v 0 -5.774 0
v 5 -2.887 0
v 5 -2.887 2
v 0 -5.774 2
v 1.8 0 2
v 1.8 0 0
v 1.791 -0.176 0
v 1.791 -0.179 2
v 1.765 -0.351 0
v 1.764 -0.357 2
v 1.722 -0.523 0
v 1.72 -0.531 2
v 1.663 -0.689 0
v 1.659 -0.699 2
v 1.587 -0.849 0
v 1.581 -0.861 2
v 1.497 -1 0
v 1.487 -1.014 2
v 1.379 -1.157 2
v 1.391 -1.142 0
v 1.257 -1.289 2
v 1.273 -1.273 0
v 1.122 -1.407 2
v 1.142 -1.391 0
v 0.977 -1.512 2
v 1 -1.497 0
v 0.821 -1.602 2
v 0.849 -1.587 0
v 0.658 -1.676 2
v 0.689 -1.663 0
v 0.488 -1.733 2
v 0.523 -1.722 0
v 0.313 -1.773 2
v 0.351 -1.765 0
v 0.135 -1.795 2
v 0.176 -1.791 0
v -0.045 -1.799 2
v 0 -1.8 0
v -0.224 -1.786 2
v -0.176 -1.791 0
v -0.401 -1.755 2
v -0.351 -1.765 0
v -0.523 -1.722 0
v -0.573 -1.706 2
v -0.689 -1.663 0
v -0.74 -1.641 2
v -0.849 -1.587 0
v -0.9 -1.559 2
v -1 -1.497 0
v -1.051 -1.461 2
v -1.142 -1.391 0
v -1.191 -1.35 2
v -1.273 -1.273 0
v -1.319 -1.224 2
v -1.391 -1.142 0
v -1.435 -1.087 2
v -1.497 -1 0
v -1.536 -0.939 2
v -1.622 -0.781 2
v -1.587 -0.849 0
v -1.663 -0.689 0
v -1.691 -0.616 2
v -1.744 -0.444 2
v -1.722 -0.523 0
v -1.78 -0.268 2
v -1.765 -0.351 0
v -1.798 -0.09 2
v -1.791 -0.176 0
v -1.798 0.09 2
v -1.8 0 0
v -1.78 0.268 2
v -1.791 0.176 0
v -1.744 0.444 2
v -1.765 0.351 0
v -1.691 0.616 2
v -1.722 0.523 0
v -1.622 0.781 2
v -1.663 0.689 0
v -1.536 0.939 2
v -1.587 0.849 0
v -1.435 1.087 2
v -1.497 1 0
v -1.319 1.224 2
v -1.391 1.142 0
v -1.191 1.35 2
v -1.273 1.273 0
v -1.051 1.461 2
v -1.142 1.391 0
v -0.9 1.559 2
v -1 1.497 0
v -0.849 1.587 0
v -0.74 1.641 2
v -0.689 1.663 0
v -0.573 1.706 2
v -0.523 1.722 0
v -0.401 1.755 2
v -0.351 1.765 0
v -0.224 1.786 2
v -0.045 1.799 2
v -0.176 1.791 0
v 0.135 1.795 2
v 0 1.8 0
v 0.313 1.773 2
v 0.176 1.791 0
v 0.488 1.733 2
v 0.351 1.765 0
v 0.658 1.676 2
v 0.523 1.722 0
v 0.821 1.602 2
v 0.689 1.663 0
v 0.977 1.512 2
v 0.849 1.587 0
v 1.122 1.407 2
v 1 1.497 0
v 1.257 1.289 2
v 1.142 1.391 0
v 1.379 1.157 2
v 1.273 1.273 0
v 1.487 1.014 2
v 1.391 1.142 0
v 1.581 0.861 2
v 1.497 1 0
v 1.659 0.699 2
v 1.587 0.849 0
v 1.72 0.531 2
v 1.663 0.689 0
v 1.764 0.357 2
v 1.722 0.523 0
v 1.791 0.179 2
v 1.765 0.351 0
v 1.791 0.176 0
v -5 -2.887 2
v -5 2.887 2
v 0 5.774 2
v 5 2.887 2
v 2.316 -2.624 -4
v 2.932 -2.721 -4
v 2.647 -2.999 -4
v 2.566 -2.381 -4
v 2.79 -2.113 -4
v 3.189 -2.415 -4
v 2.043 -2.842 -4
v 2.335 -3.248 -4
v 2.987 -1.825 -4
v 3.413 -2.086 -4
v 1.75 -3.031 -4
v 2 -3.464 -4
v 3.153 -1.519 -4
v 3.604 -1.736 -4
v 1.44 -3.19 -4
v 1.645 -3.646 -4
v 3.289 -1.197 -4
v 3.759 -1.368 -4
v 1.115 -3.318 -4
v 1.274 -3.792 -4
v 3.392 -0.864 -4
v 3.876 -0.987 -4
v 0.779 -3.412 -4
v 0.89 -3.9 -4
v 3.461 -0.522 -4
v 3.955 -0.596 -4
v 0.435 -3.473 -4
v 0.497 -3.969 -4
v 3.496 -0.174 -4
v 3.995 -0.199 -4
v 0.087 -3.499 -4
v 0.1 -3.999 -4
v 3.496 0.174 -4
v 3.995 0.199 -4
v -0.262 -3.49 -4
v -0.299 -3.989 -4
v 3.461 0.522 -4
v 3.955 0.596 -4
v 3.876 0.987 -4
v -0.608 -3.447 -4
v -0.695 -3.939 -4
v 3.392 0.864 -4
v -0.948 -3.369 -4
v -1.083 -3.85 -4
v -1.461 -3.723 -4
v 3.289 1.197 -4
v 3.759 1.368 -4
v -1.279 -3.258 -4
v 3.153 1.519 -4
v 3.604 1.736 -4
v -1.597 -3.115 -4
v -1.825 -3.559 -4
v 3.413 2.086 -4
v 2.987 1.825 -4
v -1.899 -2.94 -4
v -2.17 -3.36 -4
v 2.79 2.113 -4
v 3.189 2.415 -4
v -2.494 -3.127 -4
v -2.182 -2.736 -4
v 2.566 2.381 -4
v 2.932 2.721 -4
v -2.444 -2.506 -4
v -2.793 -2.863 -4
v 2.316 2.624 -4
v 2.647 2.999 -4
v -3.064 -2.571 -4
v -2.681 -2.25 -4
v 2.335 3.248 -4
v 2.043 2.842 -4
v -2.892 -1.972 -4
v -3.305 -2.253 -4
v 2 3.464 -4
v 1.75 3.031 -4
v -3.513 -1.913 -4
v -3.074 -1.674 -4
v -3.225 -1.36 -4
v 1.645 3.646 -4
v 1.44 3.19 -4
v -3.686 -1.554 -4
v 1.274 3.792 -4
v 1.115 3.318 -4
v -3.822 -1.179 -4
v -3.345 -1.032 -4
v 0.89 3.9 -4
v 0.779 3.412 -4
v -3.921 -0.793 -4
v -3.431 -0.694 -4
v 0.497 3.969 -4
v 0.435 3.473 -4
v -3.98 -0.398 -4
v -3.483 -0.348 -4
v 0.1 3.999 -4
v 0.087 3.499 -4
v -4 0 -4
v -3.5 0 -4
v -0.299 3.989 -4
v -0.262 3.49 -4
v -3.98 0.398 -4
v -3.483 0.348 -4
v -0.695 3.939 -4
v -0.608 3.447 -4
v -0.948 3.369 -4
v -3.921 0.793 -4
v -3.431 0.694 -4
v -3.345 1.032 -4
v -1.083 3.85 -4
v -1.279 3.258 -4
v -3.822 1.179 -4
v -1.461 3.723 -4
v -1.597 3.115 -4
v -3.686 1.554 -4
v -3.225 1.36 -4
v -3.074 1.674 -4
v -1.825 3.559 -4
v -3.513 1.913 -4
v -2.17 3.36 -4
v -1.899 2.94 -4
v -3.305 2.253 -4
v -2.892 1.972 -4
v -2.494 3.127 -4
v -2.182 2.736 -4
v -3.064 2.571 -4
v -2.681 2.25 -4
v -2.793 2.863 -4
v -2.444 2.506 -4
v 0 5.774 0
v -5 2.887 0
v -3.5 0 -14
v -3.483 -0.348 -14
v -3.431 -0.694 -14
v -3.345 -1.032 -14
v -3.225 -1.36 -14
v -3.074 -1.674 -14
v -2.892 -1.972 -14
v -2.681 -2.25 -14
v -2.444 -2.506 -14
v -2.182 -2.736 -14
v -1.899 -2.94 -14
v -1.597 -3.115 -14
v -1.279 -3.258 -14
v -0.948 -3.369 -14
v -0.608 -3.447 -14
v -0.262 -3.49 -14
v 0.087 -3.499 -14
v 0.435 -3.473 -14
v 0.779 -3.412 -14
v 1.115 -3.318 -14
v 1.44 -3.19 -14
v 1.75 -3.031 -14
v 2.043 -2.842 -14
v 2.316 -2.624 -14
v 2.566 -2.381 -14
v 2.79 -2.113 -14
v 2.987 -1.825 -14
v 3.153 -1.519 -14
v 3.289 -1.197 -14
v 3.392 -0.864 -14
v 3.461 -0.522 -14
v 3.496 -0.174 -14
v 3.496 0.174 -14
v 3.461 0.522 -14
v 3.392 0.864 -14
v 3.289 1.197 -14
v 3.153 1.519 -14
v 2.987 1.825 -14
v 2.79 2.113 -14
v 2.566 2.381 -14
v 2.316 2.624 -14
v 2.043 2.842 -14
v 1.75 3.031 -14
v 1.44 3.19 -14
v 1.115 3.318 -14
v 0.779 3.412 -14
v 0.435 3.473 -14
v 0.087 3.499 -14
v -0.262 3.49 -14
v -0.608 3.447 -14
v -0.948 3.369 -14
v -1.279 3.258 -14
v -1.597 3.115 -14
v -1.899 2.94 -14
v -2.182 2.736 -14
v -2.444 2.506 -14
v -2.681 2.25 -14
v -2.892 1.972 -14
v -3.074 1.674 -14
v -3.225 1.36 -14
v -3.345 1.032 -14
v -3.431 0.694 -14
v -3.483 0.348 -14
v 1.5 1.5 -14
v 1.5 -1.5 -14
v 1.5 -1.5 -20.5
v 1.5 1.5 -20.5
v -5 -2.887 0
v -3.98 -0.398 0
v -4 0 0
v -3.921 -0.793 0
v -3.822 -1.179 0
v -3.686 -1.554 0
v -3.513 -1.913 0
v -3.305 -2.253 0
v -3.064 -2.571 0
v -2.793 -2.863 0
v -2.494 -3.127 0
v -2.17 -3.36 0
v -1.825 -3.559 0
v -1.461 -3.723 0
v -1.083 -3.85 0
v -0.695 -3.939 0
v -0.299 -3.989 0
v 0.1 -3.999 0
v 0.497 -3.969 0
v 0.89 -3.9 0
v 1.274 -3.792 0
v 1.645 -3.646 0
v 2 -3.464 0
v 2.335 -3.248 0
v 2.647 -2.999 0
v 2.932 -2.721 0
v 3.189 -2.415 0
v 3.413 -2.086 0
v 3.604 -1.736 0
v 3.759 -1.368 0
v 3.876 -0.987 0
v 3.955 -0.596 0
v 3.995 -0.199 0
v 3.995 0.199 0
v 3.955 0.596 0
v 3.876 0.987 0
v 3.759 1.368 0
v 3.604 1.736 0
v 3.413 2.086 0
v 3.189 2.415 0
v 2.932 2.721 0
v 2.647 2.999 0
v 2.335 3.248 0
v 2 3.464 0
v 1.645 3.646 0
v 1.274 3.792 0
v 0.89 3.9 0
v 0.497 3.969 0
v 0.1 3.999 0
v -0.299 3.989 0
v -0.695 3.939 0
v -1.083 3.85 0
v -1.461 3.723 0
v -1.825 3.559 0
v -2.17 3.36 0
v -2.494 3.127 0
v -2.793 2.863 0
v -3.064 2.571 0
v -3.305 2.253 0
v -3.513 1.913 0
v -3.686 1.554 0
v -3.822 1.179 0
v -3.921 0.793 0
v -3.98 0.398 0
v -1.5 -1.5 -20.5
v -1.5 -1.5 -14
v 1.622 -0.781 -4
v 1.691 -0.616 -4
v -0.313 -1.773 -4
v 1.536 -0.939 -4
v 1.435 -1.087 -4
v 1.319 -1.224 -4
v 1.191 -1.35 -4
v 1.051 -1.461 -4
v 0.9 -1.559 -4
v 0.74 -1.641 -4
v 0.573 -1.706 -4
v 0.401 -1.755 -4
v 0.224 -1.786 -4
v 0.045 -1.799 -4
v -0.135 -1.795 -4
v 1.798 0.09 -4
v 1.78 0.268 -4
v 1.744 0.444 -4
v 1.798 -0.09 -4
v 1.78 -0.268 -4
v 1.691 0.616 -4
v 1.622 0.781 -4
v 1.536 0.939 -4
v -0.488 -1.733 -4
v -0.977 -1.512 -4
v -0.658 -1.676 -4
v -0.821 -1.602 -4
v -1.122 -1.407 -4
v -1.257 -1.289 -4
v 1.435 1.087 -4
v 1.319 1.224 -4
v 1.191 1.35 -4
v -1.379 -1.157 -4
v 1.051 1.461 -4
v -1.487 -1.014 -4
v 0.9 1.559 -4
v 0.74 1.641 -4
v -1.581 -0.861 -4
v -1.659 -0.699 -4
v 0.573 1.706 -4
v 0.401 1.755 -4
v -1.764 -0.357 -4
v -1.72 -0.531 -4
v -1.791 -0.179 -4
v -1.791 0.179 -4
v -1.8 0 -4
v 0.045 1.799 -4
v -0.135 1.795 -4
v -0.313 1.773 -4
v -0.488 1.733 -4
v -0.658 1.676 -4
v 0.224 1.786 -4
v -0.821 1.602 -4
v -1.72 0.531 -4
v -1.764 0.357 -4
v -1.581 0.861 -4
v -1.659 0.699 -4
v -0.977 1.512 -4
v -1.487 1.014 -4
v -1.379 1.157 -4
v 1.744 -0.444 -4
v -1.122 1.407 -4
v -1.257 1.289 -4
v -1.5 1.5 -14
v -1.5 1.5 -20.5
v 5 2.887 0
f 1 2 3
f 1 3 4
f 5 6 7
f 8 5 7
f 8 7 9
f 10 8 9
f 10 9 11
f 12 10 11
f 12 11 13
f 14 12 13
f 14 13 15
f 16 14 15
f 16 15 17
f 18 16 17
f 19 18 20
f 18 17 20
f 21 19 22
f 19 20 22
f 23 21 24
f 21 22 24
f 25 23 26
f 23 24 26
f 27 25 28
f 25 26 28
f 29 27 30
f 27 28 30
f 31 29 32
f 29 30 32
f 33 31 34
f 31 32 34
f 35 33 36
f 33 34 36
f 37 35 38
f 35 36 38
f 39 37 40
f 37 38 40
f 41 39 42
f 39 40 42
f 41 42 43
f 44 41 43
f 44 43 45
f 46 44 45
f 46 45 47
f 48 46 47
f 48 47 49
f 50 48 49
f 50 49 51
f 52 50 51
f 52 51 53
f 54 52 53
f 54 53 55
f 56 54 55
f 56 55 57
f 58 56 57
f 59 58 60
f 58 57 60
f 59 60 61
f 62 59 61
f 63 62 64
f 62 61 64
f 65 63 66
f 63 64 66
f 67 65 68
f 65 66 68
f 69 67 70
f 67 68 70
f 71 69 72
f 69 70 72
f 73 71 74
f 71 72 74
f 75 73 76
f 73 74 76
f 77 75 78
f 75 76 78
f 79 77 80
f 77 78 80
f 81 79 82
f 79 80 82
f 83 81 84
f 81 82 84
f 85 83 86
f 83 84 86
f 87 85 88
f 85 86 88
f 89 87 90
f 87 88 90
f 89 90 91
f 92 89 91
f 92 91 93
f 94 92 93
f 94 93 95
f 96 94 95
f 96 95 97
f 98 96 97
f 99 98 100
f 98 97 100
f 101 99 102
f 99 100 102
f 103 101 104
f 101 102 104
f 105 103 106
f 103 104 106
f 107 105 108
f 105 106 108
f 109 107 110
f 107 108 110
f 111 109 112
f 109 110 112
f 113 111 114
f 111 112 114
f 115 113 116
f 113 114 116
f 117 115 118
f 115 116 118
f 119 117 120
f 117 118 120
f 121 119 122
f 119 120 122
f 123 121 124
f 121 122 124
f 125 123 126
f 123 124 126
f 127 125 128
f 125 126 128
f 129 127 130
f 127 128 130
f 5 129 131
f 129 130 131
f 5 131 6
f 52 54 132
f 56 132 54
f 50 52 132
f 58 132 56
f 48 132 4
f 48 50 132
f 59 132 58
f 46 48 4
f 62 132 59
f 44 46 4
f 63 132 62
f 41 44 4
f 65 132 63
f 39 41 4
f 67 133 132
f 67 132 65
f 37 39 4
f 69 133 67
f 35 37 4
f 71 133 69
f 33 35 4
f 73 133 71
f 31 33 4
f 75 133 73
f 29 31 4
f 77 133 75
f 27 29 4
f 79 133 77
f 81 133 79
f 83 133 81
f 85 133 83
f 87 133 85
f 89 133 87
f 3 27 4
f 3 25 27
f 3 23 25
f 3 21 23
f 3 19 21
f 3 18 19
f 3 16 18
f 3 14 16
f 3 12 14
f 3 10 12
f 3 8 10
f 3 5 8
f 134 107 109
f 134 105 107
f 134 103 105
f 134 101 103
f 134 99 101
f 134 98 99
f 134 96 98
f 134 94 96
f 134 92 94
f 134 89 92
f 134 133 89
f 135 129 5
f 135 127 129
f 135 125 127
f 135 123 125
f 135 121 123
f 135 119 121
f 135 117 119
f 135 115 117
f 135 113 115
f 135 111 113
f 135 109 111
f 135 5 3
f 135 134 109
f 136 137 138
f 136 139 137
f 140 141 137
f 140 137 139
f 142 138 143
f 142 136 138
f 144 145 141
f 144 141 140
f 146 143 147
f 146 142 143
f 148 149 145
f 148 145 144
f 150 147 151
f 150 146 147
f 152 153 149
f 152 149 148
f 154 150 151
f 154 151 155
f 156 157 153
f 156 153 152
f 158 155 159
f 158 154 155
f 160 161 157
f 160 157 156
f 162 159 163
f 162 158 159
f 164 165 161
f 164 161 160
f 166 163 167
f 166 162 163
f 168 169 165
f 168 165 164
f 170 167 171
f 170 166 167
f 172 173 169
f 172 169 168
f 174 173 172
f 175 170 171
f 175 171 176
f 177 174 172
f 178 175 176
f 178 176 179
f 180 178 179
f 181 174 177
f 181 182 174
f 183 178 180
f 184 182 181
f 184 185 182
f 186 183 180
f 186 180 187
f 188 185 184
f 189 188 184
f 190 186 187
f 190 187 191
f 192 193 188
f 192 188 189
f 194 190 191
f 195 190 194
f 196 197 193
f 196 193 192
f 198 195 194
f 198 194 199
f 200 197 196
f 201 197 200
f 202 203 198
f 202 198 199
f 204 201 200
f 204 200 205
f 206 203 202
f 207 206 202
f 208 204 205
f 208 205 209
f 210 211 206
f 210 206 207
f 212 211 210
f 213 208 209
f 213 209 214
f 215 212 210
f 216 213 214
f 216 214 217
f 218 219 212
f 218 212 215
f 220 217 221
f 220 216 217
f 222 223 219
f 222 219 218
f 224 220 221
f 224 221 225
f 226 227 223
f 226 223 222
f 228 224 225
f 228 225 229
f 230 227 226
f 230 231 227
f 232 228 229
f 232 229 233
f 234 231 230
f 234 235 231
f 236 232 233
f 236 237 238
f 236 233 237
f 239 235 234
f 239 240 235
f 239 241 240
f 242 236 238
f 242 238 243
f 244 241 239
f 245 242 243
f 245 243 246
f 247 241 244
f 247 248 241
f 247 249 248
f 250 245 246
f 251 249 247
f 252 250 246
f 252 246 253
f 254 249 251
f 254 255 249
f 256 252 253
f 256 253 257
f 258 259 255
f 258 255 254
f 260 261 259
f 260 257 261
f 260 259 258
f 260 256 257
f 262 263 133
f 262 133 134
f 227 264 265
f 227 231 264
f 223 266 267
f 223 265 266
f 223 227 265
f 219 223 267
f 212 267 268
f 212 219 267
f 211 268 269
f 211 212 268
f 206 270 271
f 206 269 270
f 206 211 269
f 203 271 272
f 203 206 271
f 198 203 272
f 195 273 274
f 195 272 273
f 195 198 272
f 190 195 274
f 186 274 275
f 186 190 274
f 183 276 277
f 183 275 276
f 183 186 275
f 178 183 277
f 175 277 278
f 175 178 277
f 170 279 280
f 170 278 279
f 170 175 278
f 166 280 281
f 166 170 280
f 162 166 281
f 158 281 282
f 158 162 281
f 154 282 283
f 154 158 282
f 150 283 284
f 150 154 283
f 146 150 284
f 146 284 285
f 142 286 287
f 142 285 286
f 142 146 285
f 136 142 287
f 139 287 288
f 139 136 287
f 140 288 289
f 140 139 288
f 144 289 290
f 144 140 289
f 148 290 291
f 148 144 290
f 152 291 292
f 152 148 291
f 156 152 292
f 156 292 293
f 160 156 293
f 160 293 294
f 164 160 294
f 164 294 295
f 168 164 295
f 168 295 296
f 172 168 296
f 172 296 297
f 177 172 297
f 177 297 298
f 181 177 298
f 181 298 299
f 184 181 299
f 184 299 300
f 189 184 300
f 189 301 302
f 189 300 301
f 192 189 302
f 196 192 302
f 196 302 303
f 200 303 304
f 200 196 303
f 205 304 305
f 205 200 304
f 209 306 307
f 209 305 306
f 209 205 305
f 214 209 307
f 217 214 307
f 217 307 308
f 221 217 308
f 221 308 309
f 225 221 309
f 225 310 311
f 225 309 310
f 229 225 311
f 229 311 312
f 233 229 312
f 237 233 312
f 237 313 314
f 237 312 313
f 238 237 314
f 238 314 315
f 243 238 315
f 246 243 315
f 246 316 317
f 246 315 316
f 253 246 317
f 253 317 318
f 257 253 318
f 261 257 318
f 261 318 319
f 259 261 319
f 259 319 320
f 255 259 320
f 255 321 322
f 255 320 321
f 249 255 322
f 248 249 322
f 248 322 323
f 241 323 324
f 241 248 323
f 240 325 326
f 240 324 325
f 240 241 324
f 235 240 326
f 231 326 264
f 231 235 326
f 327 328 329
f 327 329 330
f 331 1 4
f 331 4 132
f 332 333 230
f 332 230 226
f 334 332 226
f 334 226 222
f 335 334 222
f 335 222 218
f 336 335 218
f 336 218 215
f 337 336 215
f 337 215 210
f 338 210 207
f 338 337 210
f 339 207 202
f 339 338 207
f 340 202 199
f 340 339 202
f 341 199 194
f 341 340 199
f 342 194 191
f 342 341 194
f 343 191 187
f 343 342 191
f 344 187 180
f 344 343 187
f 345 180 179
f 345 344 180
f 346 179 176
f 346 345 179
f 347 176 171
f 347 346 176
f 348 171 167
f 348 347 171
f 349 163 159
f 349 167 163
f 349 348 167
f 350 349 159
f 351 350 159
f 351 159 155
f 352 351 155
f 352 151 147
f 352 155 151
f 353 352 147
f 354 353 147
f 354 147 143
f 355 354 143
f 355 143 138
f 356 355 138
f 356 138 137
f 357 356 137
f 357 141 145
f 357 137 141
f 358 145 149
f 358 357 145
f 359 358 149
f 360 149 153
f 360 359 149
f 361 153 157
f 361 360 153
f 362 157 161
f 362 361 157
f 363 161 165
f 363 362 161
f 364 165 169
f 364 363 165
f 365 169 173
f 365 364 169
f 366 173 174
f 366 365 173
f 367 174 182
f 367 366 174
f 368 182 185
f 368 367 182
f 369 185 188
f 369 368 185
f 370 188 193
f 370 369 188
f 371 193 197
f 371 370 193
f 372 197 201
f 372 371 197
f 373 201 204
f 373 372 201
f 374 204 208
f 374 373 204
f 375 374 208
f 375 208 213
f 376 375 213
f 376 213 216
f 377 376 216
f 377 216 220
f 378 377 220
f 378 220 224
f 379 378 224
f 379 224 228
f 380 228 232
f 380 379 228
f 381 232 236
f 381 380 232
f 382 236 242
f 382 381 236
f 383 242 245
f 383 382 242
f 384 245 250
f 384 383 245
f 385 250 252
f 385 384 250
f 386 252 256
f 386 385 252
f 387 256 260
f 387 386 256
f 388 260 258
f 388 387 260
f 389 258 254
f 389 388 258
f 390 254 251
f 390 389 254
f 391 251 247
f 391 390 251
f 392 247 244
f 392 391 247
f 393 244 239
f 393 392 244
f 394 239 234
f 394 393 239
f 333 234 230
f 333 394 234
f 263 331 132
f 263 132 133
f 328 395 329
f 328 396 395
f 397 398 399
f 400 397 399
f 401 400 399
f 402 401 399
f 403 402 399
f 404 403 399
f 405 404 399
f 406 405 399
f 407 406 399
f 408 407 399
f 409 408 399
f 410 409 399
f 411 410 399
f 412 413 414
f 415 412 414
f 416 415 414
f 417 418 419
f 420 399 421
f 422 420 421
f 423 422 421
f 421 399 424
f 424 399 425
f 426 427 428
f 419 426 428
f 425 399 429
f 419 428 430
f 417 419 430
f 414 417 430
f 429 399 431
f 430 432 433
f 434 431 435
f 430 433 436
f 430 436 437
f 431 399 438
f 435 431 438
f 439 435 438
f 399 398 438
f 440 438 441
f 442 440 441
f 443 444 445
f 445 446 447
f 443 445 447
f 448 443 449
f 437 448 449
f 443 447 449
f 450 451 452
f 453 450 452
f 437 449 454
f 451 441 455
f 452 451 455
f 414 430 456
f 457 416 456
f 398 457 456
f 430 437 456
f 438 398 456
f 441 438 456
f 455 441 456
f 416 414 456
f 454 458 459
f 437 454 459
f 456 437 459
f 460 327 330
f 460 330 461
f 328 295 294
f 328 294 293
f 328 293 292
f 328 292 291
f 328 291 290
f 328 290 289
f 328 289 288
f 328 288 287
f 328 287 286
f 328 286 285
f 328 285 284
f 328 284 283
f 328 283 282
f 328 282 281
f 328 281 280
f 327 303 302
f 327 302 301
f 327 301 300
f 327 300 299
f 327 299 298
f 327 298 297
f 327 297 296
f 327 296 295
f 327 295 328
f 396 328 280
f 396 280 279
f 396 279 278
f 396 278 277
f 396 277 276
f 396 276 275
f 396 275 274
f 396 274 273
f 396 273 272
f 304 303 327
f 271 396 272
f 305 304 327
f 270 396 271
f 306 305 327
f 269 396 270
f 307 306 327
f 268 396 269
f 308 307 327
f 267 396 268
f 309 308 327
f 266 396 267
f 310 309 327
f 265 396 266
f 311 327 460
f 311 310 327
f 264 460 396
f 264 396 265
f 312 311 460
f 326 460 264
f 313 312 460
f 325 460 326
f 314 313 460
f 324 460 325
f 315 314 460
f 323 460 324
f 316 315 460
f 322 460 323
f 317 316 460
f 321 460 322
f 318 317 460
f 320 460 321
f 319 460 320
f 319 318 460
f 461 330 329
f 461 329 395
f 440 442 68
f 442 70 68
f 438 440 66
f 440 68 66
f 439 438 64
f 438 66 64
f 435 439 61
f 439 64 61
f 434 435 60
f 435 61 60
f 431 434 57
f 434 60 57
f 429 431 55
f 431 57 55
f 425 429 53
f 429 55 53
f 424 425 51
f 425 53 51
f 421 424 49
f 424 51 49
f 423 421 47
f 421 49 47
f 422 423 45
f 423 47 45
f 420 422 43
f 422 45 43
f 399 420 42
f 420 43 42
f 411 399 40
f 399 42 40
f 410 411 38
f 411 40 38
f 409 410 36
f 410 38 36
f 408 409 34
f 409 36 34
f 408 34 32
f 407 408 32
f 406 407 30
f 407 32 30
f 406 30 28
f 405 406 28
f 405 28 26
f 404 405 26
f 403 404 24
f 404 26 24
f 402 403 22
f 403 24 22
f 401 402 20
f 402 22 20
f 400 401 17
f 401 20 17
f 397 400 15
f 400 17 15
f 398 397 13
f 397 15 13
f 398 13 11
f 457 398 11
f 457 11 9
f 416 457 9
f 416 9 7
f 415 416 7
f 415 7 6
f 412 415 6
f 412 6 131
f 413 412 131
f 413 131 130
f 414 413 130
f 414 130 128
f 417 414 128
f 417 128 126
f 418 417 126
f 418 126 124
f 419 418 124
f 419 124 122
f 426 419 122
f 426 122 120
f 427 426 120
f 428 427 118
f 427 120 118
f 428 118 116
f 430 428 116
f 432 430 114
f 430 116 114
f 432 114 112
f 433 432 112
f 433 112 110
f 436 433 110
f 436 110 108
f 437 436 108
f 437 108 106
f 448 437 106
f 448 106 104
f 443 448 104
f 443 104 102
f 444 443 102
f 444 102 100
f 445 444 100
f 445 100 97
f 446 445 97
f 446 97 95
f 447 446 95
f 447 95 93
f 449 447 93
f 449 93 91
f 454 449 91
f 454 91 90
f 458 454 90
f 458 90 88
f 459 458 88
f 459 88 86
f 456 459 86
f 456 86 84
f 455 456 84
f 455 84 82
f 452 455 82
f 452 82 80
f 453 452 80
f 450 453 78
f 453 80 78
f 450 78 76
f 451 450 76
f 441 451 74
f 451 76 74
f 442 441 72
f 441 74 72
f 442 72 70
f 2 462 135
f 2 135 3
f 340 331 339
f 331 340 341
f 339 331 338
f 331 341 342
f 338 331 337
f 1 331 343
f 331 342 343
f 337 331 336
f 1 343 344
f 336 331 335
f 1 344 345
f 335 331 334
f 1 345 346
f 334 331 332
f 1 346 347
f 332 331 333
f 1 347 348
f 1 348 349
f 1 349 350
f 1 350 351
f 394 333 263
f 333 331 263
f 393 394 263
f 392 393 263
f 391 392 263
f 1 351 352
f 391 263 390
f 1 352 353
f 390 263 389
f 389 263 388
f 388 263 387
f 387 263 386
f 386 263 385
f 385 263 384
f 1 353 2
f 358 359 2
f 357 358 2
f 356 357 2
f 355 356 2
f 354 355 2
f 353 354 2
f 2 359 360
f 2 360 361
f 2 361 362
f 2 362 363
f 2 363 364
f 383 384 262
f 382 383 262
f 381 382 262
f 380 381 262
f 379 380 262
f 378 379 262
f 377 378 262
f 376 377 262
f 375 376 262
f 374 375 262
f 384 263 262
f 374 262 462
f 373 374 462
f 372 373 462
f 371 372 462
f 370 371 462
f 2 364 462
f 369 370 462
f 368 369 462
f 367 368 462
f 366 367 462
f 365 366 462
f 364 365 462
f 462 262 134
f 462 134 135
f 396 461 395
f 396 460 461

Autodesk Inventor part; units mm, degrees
ref_plane "YZ Plane" through (0, 0, 0) normal (1, 0, 0) x (0, 1, 0)
ref_plane "XZ Plane" through (0, 0, 0) normal (0, 1, 0) x (-1, 0, 0)
ref_plane "XY Plane" through (0, 0, 0) normal (0, 0, 1) x (1, 0, 0)
sketch "スケッチ1" plane through (0, 0, 0) normal (0, 0, 1) x (1, 0, 0)
  line L0 (0, 5.7735) -> (5, 2.8868)
  line L1 (5, 2.8868) -> (5, -2.8868)
  line L2 (5, -2.8868) -> (0, -5.7735)
  line L3 (0, -5.7735) -> (-5, -2.8868)
  line L4 (-5, -2.8868) -> (-5, 2.8868)
  line L5 (-5, 2.8868) -> (0, 5.7735)
  circle A0 centre (0, 0) radius 1.8
  dimension "d0" = 10
  dimension "d1" = 3.6
extrude "押し出し1" add sketch "スケッチ1" along normal blind 2
sketch "スケッチ2" plane through (0, 0, 0) normal (0, 0, -1) x (-1, 0, 0)
  circle A0 centre (0, 0) radius 1.8
  circle A1 centre (0, 0) radius 4
  circle A2 centre (0, 0) radius 1.8 projected
  dimension "d4" = 8
extrude "押し出し2" add sketch "スケッチ2" along normal blind 4
sketch "スケッチ3" plane through (0, 0, -4) normal (0, 0, -1) x (-1, 0, 0)
  circle A0 centre (0, 0) radius 3.5
  circle A1 centre (0, 0) radius 1.8
  circle A2 centre (0, 0) radius 1.8 projected
  dimension "d7" = 7
extrude "押し出し3" add sketch "スケッチ3" along normal blind 10 contours A0 | A1
sketch "スケッチ4" plane through (0, 0, -14) normal (0, 0, -1) x (-1, 0, 0)
  line L0 (1.5, -1.5) -> (-1.5, -1.5)
  line L1 (-1.5, -1.5) -> (-1.5, 1.5)
  line L2 (-1.5, 1.5) -> (1.5, 1.5)
  line L3 (1.5, 1.5) -> (1.5, -1.5)
  line L4 (1.5, -1.5) -> (-1.5, 1.5) construction
  line L5 (-1.5, -1.5) -> (1.5, 1.5) construction
  point P0 (0, 0)
  dimension "d10" = 3
  dimension "d11" = 3
extrude "押し出し4" add sketch "スケッチ4" along normal blind 6.5
properties part number "MJ073H"
